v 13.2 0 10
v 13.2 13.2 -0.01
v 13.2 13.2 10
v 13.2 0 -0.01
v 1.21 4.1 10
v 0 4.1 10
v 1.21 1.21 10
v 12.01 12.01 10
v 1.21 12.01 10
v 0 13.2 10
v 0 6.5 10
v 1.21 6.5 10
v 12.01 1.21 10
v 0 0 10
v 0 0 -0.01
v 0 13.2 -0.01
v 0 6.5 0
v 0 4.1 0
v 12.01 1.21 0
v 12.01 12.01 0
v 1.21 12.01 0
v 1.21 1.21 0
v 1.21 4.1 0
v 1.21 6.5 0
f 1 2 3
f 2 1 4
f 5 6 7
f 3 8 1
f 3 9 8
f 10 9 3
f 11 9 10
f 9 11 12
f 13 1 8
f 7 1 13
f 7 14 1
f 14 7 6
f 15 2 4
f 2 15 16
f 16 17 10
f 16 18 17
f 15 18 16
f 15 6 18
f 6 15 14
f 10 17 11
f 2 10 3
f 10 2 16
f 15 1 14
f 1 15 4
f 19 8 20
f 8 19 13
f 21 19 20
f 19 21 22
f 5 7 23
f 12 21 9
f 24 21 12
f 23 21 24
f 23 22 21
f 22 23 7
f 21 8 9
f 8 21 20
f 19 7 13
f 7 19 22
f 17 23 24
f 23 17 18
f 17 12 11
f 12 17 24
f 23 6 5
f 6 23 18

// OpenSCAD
// file: ../../Base/Rotation.scad
// Fischertechnik Box Foundation
// Geometry Helpers Rotation

include <PlacementOptions.scad>

// getRotatedSpace(space, rotation=NoRotation)
// Rotates the space dependent on the specified rotation

function getRotatedSpace(space, rotation=NoRotation) = [
    (rotation == Rotate90 || rotation == Rotate270) ? space.y : space.x,
    (rotation == Rotate90 || rotation == Rotate270) ? space.x : space.y
];

// Rotates the given space around the fixed left lower corner
// space = the space the children needs as width/depth list [width,depth]
// rotation = 0 Rotate0 degrees, 1 Rotate90 degrees, 2 Rotate180 degrees, 3 Rotate270 degrees (equivalent to -90)

module RotateFix(space, rotation=NoRotation) {
    dy = (rotation == Rotate0 || rotation == Rotate270) ? 0 :
        (rotation == Rotate90) ? space.x :
        space.y;
    dx = (rotation < Rotate180) ? 0 :
        (rotation == Rotate180) ? space.x :
        space.y;
    
    translate([dx, dy, 0])
        rotate([0, 0, rotations[rotation]])
            children();
}
// file: ../../Base/Alignment.scad
// Fischertechnik Box Foundation
// Geometry Helpers Alignment

include <PlacementOptions.scad>

// getAlignedX(elementWidth, spaceWidth, align=AlignRight, offset=0)
// Gets the aligned X offset of an element with the given
// width in the given space.
// elementWidth = The width of the element to positon
// spaceWidth = The space where the element should be aligned
// align = 0 AlignLeft, 1 AlignCenter, 2 AlignRight
// offset = an optional offset from the aligned position. When
// aligned left or centered, then positive values are in X direction.
// When aligned right then positive values are in negative X direction.

function getAlignedX(elementWidth, spaceWidth, align=AlignRight, offset=0) =
    (align == AlignLeft) ?
        offset :
        ((align == AlignCenter) ?
        (spaceWidth - elementWidth)/2 + offset :
        spaceWidth - offset - elementWidth);

// getAlignedY(elementDepth, spaceDepth, align=AlignTop, offset=0)
// Gets the aligned Y offset of an element with the given
// depth in the given space.
// elementDepth = The depth of the element to positon
// spaceDepth = The space where the element should be aligned
// align = 0 AlignBottom, 1 AlignCenter, 2 AlignTop
// offset = an optional offset from the aligned position. When
// aligned bottom or centered, then positive values are in Y direction.
// When aligned top then positive values are in negative Y direction.

function getAlignedY(elementDepth, spaceDepth, align=AlignTop, offset=0) =
    (align == AlignBottom) ?
        offset :
        ((align == AlignCenter) ?
        (spaceDepth - elementDepth)/2 + offset :
        spaceDepth - offset - elementDepth);
// file: ../../Base/PlacementOptions.scad
// Fischertechnik Box Foundation
// Placement Options

// Alignment
NoAlign = 0;
AlignLeft = 1;
AlignBottom = 2;
AlignCenter = 3;
AlignRight = 4;
AlignTop = 5;

// Element rotation degree steps
rotations = [0, -90, -180, -270];

// Rotation
NoRotation = 0;
Rotate0 = 0;
Rotate90 = 1;
Rotate180 = 2;
Rotate270 = 3;

// Docking (seen from above)
NoDock = -1;
DockLeft = 0;
DockTop = 1;
DockRight = 2;
DockCorner = 2;
DockBottom = 3;

// Web corners
LowerLeft = 0;
UpperLeft = 1;
UpperRight = 2;
LowerRight = 3;

// Web position relative to corner
LeftOfCorner = 0;
RightOfCorner = 1;
// file: ../../Base/Boxes.scad
// Fischertechnik Box Foundation
// Pre-designed Boxes

use <Constants.scad>

include <PlacementOptions.scad>

box190Width = 190;
box190Depth = 130;
box130Width = 130;
box130Depth = 95;

// Values are from an original ec3 box
topBottomDifference = 1.5;
outerHeight = 40;
baseThickness = 1.8;
innerHeight = outerHeight - baseThickness;
stackExcess = 5.7;
radius = 3.5;
wallThickness = 1.5;
tolerance = 0.2;

boxWallThickness = wallThickness;
boxBaseThickness = baseThickness;
boxWebWidth = 3.0;

// getBoxWallThickness()
// Gets the wall thickness of a Fischertechnik Box
function getBoxWallThickness() = boxWallThickness;

// getBoxUsageHeight(height = 38.2)
// Gets the usable height of a Fischertechnik box
// height = Outer height of the box from the bottom to the upper edge.
function getBoxUsageHeight(height = outerHeight) = height - baseThickness - stackExcess;

// getBoxInnerHeight()
// Gets the inner height of a Fischertechnik box, including the stack excess
function getBoxInnerHeight() = innerHeight;

// getBoxBaseThickness()
// Gets the thickness of the Fischertechnik box base.
function getBoxBaseThickness() = boxBaseThickness;

// getBoxWebWidth()
// Gets the width of a box web
function getBoxWebWidth() = boxWebWidth;

// getBox190Space()
// Gets the usable inner space of a Box 190 as an x/y-list
function getBox190Space() = [
    box190Width - 2*getBoxWallThickness() - topBottomDifference, 
    box190Depth - 2*getBoxWallThickness() - topBottomDifference ];

// RoundedCornerPlate(width, depth, height, radius)
// Creates a body plate with rounded corners for a box. Used
// also to create the complete box with the hull module.
// width = Width of the plate
// depth = depth of the plate 
// height = thickness of the plate
// radius = radius of the rounded corner
module RoundedCornerPlate(width, depth, height, radius) {
    translate([radius, radius])
    hull() {
        w = width-2*radius;
        d = depth-2*radius;
        cube([w, d, height]);
        cylinder(height, r=radius, $fn=getFragments());
        translate([w, 0])
            cylinder(height, r=radius, $fn=getFragments());
        translate([w, d])
            cylinder(height, r=radius, $fn=getFragments());
        translate([0, d])
            cylinder(height, r=radius, $fn=getFragments());
    }
}

// BoxBase(width, depth)
// Creates an empty stackable Fischertechnik compatible box
// width = Outer width of the box (190, 130, ...)
// depth = Outer depth of the box (130, 95, ...)

module BoxBase(width, depth, height=outerHeight) {    
    thinPlate = 0.01;

    innerHeight = height - baseThickness;    
    
    module Body(tolerance=tolerance) {
        hull() {
            // Bottom with tolerance to fit into the original boxes when stacked
            translate([-wallThickness+tolerance, -wallThickness+tolerance, -baseThickness])
                RoundedCornerPlate(width-topBottomDifference-2*tolerance, depth-topBottomDifference-2*tolerance, thinPlate, radius);
            
            // Top
            translate([-wallThickness-topBottomDifference/2, -wallThickness-topBottomDifference/2, innerHeight-thinPlate])
                RoundedCornerPlate(width, depth, thinPlate, radius);
         }
    }

    module Cutoff() {
        hull() {
            coWidth = width - 2*wallThickness;
            coDepth = depth - 2*wallThickness;
            
            // Bottom
            RoundedCornerPlate(coWidth-topBottomDifference, coDepth-topBottomDifference, thinPlate, radius);

            // Top
            translate([-topBottomDifference/2, -topBottomDifference/2, innerHeight+thinPlate]) 
                RoundedCornerPlate(coWidth, coDepth, thinPlate, radius);
        }
    }
    
    difference() {        
        Body();
        Cutoff();
        stackOffset = innerHeight - stackExcess;
        translate([0, 0, stackOffset + baseThickness])
            Body(tolerance=0);
    }
}

// Creates the Fischertechnik empty box 130x190 mm and places it at position 0,0
// 190x130 are the outer sizes, the inner space is slightly smaller. Use getBox190Space() to get the inner sizes.
// The box is positioned that the usable inner space is at the 0,0,0 position.

module Box190() {
    BoxBase(box190Width, box190Depth);
}

// Gets the usable inner space of a Box 130 as an x/y-list
function getBox130Space() = [
    box130Width - 2*getBoxWallThickness() - topBottomDifference, 
    box130Depth - 2*getBoxWallThickness() - topBottomDifference ];

// Creates the Fischertechnik empty box 95x130 mm and places it at position 0,0
// 190x130 are the outer sizes, the inner space is slightly smaller. Use getBox190Space() to get the inner sizes.
// The box is positioned that the usable inner space is at the 0,0,0 position.

module Box130() {
    BoxBase(box130Width, box130Depth);
}

// Creates a web at the specified box walls
// corner 0 = LowerLeft, 1 = UpperLeft, 2 = UpperRight, 3 = LowerRight
// side 0 = LeftOfCorner, 1 = RightOfCorner
// distance = Distance in mm from the corner
// boxSpace = inner width and depth of the box (default: Box 190)
// webWidth = length of the web (default is 3 mms)
// webThickness = thickness of the web (default is 1 mm)
// height = Height of the web (standard is getBoxUsageHeight())
// sink = How much of the web is sunk into the wall

module BoxWeb(
    corner, 
    side, 
    distance, 
    boxSpace=getBox190Space(), 
    webWidth=getBoxWebWidth(), 
    webThickness=1.0, 
    height=getBoxUsageHeight(),
    sink = getBoxWallThickness()/2) {
    width = (corner % 2 == 0) ? 
            (side == LeftOfCorner ? webWidth : webThickness) :
            (side == LeftOfCorner ? webThickness : webWidth);

    depth = (corner % 2 == 0) ? 
            (side == RightOfCorner ? webWidth : webThickness) :
            (side == RightOfCorner ? webThickness : webWidth);
    
    xDiff = corner == LowerLeft ? 
                (side == LeftOfCorner ? -sink : distance) :
            (corner == UpperLeft ?                
                (side == LeftOfCorner ? distance : -sink) :
            (corner == UpperRight ?
                (side == LeftOfCorner ? boxSpace.x-webWidth+sink : boxSpace.x-distance-webThickness) :
                (side == LeftOfCorner ? boxSpace.x-distance-webThickness: boxSpace.x-webWidth+sink)));

    yDiff = corner == LowerLeft ? 
                (side == RightOfCorner ? -sink : distance) :
            (corner == UpperLeft ?
                (side == RightOfCorner ? boxSpace.y-distance-webThickness : boxSpace.y-webWidth+sink) :
            (corner == UpperRight ?
                (side == RightOfCorner ? boxSpace.y-webWidth+sink : boxSpace.y-distance-webThickness) :
                (side == RightOfCorner ? distance : -sink)));
    
    translate([xDiff, yDiff, -getExcess()])
        cube([width, depth, height + 2*getExcess()]);
}
// file: ../../Base/Placement.scad
// Fischertechnik Box Foundation
// Geometry Helpers Placement

use <Constants.scad>
use <Alignment.scad>
use <Rotation.scad>
use <Boxes.scad>

include <PlacementOptions.scad>

// Place(x=0, y=0, elementSpace=[0,0], alignX=AlignLeft, alignY=AlignBottom, rotation=Rotate0, boxSpace=getBox190Space())
// Places the child at the specified position
// y = Y-Position. This is a relative position when an X aligment is specified.
// x = X-Position. This is a relative position when an Y aligment is specified.
// elementSpace = space of the element to be placed [x,y]
// alignX = -1=NoAlign, 0 AlignLeft, 1 AlignCenter, 3 AlignRight (elementSpace and boxSpace required!)
// alignY = -1=NoAlign, 2 AlignBottom, 1 AlignCenter, 4 AlignTop (elementSpace and boxSpace required!)
// rotation = 0 Rotate0 0 degrees, 1 Rotate90 90 degrees, 
// 2 Rotate180 180 degrees, 3 Rotate270 270 degrees (equivalent to -90)
// boxSpace = Inner space of the box where the placement occurs [x,y] - default is Box 190x130 inner space

module Place(x=0, y=0, elementSpace=[0,0], 
  alignX=AlignLeft, alignY=AlignBottom, 
  rotation=NoRotation, boxSpace=getBox190Space()) {

    module Position(x, y, space, rotation=Rotate0) {
        translate([x, y, 0])
            RotateFix(space, rotation)
                children();
    }

    space = getRotatedSpace(elementSpace, rotation);
    alignedX = getAlignedX(space.x, boxSpace.x, alignX, x);
    alignedY = getAlignedY(space.y, boxSpace.y, alignY, y);
    Position(alignedX, alignedY, elementSpace, rotation)
        children();
}

// Center(space=getBox130Space(), elementSpace=[0,0])
// space = Space where the children is centered. For cylinder use centered=true and no elementSpace.
// elementSpace = space of the element to be centered [x,y]

module Center(space=getBox190Space(), elementSpace=[0,0]) {
    Place(elementSpace=elementSpace, boxSpace=space, alignX=AlignCenter, alignY=AlignCenter)
        children();
}

// CenterHorizontal(width=0, y=0, offset=0, space=getBox130Space())
// width = Width of the element to be placed.
// y = Y position of the element
// offset = Offset from the center position (negative will be left of the center)
// space = Space where the element is placed

module CenterHorizontal(width=0, y=0, offset=0, space=getBox190Space()) {
    Place(x=offset, y=y, elementSpace=[width, 0], boxSpace=space, alignX=AlignCenter)
        children(0);
}

// CenterVertical(depth=0, x=0, offset=0, space=getBox130Space())
// depth = Depth of the element to be placed.
// x = X position of the element
// offset = Offset from the center position (negative will be down of the center)
// space = Space where the element is placed

module CenterVertical(depth=0, x=0, offset=0, space=getBox190Space()) {
    Place(x=x, y=offset, elementSpace=[0, depth], boxSpace=space, alignY=AlignCenter)
        children(0);
}

// getIsVertical(align)
// True if the specified alignment needs a vertical orientation for a divider (AlignRight, AlignLeft)

function getIsVertical(align) = (align == AlignRight || align == AlignLeft);

// getIsHorizontal(align)
// True if the specified alignment needs a horizontal orientation for a divider (AlignTop, AlignBottom)

function getIsHorizontal(align) = (align == AlignTop || align == AlignBottom);
// file: ../../Base/Constants.scad
// Fischertechnik Box Foundation
// Constants

// Constant values necessary for multiple elements

// Base constants
dividerThickness = 1.2;
excess = 0.01;
fragments = 90;
tolerance = 0.8;

// Gets the thickness of a divider 
function getDividerThickness() = dividerThickness;

// Gets the excess that is used to merge walls into each other
function getExcess() = excess;

// Gets amount of fragments of a cylinder
function getFragments() = fragments;

// Gets the inner tolerance of a frame to each side
function getTolerance() = tolerance;


// Fischertechnik specific constants
axisDiameter = 4;
axisBottomDiameter = axisDiameter + 1;
axisTolerance = 0.2;

// Gets axis diameter of Fischertechnik axis
function getAxisDiameter() = axisDiameter;

// Gets axis diameter tolerance (subtracted for element axis)
function getAxisTolerance() = axisTolerance;

// Gets the axis diameter for standing axis
function getStandAxisDiameter() = getAxisDiameter() - getAxisTolerance();

// Gets axis bottom diameter for thicker part at the bottom
function getAxisBottomDiameter() = axisBottomDiameter;

pinHeight = 2.5;

// gets the height of a connecting pin
function getPinHeight() = pinHeight;

standardEdgeDistance = 2.5;
standardWebDistance = 11.5;
standardCornerLength = 15;

// gets the standard distance to the wall of the box for dockable frames with webs
function getStandardEdgeDistance() = standardEdgeDistance;

// gets the standard distance of each web to the corner of the dockable frame
function getStandardWebDistance() = standardWebDistance;

// gets the standard length of the corner walls of a dockable frame
function getStandardCornerLength() = standardCornerLength;

tubeWallFactor = 0.8;

// gets the wall thickness of a tube.
function getTubeWallThickness() = tubeWallFactor * getDividerThickness();

smallPartsFrameHeight = 20;

// gets the frame height for docked small parts boxes.
function getSmallPartsFrameHeight() = smallPartsFrameHeight;

hubRingDiameter = 19.5;
hubRingLevelDiameter = 21;

// gets the diameter of a tube matching the inner ring of a wheel
function getHubRingDiameter() = hubRingDiameter;

// gets the diameter of a hub tube with a thicker diameter
function getHubRingLevelDiameter() = hubRingLevelDiameter;
// main file
// Fischertechnik Box Foundation
// ModelBase
// Test FrameLeftCutoff

use <../../Base/Constants.scad>
use <../../ModelBase/Simple.scad>

cutoffWidth = 5;
offset = 0;

difference() {
    Frame([10,10,10]);
    FrameLeftCutoff([10,10,10], cutoffWidth, offset);
}
